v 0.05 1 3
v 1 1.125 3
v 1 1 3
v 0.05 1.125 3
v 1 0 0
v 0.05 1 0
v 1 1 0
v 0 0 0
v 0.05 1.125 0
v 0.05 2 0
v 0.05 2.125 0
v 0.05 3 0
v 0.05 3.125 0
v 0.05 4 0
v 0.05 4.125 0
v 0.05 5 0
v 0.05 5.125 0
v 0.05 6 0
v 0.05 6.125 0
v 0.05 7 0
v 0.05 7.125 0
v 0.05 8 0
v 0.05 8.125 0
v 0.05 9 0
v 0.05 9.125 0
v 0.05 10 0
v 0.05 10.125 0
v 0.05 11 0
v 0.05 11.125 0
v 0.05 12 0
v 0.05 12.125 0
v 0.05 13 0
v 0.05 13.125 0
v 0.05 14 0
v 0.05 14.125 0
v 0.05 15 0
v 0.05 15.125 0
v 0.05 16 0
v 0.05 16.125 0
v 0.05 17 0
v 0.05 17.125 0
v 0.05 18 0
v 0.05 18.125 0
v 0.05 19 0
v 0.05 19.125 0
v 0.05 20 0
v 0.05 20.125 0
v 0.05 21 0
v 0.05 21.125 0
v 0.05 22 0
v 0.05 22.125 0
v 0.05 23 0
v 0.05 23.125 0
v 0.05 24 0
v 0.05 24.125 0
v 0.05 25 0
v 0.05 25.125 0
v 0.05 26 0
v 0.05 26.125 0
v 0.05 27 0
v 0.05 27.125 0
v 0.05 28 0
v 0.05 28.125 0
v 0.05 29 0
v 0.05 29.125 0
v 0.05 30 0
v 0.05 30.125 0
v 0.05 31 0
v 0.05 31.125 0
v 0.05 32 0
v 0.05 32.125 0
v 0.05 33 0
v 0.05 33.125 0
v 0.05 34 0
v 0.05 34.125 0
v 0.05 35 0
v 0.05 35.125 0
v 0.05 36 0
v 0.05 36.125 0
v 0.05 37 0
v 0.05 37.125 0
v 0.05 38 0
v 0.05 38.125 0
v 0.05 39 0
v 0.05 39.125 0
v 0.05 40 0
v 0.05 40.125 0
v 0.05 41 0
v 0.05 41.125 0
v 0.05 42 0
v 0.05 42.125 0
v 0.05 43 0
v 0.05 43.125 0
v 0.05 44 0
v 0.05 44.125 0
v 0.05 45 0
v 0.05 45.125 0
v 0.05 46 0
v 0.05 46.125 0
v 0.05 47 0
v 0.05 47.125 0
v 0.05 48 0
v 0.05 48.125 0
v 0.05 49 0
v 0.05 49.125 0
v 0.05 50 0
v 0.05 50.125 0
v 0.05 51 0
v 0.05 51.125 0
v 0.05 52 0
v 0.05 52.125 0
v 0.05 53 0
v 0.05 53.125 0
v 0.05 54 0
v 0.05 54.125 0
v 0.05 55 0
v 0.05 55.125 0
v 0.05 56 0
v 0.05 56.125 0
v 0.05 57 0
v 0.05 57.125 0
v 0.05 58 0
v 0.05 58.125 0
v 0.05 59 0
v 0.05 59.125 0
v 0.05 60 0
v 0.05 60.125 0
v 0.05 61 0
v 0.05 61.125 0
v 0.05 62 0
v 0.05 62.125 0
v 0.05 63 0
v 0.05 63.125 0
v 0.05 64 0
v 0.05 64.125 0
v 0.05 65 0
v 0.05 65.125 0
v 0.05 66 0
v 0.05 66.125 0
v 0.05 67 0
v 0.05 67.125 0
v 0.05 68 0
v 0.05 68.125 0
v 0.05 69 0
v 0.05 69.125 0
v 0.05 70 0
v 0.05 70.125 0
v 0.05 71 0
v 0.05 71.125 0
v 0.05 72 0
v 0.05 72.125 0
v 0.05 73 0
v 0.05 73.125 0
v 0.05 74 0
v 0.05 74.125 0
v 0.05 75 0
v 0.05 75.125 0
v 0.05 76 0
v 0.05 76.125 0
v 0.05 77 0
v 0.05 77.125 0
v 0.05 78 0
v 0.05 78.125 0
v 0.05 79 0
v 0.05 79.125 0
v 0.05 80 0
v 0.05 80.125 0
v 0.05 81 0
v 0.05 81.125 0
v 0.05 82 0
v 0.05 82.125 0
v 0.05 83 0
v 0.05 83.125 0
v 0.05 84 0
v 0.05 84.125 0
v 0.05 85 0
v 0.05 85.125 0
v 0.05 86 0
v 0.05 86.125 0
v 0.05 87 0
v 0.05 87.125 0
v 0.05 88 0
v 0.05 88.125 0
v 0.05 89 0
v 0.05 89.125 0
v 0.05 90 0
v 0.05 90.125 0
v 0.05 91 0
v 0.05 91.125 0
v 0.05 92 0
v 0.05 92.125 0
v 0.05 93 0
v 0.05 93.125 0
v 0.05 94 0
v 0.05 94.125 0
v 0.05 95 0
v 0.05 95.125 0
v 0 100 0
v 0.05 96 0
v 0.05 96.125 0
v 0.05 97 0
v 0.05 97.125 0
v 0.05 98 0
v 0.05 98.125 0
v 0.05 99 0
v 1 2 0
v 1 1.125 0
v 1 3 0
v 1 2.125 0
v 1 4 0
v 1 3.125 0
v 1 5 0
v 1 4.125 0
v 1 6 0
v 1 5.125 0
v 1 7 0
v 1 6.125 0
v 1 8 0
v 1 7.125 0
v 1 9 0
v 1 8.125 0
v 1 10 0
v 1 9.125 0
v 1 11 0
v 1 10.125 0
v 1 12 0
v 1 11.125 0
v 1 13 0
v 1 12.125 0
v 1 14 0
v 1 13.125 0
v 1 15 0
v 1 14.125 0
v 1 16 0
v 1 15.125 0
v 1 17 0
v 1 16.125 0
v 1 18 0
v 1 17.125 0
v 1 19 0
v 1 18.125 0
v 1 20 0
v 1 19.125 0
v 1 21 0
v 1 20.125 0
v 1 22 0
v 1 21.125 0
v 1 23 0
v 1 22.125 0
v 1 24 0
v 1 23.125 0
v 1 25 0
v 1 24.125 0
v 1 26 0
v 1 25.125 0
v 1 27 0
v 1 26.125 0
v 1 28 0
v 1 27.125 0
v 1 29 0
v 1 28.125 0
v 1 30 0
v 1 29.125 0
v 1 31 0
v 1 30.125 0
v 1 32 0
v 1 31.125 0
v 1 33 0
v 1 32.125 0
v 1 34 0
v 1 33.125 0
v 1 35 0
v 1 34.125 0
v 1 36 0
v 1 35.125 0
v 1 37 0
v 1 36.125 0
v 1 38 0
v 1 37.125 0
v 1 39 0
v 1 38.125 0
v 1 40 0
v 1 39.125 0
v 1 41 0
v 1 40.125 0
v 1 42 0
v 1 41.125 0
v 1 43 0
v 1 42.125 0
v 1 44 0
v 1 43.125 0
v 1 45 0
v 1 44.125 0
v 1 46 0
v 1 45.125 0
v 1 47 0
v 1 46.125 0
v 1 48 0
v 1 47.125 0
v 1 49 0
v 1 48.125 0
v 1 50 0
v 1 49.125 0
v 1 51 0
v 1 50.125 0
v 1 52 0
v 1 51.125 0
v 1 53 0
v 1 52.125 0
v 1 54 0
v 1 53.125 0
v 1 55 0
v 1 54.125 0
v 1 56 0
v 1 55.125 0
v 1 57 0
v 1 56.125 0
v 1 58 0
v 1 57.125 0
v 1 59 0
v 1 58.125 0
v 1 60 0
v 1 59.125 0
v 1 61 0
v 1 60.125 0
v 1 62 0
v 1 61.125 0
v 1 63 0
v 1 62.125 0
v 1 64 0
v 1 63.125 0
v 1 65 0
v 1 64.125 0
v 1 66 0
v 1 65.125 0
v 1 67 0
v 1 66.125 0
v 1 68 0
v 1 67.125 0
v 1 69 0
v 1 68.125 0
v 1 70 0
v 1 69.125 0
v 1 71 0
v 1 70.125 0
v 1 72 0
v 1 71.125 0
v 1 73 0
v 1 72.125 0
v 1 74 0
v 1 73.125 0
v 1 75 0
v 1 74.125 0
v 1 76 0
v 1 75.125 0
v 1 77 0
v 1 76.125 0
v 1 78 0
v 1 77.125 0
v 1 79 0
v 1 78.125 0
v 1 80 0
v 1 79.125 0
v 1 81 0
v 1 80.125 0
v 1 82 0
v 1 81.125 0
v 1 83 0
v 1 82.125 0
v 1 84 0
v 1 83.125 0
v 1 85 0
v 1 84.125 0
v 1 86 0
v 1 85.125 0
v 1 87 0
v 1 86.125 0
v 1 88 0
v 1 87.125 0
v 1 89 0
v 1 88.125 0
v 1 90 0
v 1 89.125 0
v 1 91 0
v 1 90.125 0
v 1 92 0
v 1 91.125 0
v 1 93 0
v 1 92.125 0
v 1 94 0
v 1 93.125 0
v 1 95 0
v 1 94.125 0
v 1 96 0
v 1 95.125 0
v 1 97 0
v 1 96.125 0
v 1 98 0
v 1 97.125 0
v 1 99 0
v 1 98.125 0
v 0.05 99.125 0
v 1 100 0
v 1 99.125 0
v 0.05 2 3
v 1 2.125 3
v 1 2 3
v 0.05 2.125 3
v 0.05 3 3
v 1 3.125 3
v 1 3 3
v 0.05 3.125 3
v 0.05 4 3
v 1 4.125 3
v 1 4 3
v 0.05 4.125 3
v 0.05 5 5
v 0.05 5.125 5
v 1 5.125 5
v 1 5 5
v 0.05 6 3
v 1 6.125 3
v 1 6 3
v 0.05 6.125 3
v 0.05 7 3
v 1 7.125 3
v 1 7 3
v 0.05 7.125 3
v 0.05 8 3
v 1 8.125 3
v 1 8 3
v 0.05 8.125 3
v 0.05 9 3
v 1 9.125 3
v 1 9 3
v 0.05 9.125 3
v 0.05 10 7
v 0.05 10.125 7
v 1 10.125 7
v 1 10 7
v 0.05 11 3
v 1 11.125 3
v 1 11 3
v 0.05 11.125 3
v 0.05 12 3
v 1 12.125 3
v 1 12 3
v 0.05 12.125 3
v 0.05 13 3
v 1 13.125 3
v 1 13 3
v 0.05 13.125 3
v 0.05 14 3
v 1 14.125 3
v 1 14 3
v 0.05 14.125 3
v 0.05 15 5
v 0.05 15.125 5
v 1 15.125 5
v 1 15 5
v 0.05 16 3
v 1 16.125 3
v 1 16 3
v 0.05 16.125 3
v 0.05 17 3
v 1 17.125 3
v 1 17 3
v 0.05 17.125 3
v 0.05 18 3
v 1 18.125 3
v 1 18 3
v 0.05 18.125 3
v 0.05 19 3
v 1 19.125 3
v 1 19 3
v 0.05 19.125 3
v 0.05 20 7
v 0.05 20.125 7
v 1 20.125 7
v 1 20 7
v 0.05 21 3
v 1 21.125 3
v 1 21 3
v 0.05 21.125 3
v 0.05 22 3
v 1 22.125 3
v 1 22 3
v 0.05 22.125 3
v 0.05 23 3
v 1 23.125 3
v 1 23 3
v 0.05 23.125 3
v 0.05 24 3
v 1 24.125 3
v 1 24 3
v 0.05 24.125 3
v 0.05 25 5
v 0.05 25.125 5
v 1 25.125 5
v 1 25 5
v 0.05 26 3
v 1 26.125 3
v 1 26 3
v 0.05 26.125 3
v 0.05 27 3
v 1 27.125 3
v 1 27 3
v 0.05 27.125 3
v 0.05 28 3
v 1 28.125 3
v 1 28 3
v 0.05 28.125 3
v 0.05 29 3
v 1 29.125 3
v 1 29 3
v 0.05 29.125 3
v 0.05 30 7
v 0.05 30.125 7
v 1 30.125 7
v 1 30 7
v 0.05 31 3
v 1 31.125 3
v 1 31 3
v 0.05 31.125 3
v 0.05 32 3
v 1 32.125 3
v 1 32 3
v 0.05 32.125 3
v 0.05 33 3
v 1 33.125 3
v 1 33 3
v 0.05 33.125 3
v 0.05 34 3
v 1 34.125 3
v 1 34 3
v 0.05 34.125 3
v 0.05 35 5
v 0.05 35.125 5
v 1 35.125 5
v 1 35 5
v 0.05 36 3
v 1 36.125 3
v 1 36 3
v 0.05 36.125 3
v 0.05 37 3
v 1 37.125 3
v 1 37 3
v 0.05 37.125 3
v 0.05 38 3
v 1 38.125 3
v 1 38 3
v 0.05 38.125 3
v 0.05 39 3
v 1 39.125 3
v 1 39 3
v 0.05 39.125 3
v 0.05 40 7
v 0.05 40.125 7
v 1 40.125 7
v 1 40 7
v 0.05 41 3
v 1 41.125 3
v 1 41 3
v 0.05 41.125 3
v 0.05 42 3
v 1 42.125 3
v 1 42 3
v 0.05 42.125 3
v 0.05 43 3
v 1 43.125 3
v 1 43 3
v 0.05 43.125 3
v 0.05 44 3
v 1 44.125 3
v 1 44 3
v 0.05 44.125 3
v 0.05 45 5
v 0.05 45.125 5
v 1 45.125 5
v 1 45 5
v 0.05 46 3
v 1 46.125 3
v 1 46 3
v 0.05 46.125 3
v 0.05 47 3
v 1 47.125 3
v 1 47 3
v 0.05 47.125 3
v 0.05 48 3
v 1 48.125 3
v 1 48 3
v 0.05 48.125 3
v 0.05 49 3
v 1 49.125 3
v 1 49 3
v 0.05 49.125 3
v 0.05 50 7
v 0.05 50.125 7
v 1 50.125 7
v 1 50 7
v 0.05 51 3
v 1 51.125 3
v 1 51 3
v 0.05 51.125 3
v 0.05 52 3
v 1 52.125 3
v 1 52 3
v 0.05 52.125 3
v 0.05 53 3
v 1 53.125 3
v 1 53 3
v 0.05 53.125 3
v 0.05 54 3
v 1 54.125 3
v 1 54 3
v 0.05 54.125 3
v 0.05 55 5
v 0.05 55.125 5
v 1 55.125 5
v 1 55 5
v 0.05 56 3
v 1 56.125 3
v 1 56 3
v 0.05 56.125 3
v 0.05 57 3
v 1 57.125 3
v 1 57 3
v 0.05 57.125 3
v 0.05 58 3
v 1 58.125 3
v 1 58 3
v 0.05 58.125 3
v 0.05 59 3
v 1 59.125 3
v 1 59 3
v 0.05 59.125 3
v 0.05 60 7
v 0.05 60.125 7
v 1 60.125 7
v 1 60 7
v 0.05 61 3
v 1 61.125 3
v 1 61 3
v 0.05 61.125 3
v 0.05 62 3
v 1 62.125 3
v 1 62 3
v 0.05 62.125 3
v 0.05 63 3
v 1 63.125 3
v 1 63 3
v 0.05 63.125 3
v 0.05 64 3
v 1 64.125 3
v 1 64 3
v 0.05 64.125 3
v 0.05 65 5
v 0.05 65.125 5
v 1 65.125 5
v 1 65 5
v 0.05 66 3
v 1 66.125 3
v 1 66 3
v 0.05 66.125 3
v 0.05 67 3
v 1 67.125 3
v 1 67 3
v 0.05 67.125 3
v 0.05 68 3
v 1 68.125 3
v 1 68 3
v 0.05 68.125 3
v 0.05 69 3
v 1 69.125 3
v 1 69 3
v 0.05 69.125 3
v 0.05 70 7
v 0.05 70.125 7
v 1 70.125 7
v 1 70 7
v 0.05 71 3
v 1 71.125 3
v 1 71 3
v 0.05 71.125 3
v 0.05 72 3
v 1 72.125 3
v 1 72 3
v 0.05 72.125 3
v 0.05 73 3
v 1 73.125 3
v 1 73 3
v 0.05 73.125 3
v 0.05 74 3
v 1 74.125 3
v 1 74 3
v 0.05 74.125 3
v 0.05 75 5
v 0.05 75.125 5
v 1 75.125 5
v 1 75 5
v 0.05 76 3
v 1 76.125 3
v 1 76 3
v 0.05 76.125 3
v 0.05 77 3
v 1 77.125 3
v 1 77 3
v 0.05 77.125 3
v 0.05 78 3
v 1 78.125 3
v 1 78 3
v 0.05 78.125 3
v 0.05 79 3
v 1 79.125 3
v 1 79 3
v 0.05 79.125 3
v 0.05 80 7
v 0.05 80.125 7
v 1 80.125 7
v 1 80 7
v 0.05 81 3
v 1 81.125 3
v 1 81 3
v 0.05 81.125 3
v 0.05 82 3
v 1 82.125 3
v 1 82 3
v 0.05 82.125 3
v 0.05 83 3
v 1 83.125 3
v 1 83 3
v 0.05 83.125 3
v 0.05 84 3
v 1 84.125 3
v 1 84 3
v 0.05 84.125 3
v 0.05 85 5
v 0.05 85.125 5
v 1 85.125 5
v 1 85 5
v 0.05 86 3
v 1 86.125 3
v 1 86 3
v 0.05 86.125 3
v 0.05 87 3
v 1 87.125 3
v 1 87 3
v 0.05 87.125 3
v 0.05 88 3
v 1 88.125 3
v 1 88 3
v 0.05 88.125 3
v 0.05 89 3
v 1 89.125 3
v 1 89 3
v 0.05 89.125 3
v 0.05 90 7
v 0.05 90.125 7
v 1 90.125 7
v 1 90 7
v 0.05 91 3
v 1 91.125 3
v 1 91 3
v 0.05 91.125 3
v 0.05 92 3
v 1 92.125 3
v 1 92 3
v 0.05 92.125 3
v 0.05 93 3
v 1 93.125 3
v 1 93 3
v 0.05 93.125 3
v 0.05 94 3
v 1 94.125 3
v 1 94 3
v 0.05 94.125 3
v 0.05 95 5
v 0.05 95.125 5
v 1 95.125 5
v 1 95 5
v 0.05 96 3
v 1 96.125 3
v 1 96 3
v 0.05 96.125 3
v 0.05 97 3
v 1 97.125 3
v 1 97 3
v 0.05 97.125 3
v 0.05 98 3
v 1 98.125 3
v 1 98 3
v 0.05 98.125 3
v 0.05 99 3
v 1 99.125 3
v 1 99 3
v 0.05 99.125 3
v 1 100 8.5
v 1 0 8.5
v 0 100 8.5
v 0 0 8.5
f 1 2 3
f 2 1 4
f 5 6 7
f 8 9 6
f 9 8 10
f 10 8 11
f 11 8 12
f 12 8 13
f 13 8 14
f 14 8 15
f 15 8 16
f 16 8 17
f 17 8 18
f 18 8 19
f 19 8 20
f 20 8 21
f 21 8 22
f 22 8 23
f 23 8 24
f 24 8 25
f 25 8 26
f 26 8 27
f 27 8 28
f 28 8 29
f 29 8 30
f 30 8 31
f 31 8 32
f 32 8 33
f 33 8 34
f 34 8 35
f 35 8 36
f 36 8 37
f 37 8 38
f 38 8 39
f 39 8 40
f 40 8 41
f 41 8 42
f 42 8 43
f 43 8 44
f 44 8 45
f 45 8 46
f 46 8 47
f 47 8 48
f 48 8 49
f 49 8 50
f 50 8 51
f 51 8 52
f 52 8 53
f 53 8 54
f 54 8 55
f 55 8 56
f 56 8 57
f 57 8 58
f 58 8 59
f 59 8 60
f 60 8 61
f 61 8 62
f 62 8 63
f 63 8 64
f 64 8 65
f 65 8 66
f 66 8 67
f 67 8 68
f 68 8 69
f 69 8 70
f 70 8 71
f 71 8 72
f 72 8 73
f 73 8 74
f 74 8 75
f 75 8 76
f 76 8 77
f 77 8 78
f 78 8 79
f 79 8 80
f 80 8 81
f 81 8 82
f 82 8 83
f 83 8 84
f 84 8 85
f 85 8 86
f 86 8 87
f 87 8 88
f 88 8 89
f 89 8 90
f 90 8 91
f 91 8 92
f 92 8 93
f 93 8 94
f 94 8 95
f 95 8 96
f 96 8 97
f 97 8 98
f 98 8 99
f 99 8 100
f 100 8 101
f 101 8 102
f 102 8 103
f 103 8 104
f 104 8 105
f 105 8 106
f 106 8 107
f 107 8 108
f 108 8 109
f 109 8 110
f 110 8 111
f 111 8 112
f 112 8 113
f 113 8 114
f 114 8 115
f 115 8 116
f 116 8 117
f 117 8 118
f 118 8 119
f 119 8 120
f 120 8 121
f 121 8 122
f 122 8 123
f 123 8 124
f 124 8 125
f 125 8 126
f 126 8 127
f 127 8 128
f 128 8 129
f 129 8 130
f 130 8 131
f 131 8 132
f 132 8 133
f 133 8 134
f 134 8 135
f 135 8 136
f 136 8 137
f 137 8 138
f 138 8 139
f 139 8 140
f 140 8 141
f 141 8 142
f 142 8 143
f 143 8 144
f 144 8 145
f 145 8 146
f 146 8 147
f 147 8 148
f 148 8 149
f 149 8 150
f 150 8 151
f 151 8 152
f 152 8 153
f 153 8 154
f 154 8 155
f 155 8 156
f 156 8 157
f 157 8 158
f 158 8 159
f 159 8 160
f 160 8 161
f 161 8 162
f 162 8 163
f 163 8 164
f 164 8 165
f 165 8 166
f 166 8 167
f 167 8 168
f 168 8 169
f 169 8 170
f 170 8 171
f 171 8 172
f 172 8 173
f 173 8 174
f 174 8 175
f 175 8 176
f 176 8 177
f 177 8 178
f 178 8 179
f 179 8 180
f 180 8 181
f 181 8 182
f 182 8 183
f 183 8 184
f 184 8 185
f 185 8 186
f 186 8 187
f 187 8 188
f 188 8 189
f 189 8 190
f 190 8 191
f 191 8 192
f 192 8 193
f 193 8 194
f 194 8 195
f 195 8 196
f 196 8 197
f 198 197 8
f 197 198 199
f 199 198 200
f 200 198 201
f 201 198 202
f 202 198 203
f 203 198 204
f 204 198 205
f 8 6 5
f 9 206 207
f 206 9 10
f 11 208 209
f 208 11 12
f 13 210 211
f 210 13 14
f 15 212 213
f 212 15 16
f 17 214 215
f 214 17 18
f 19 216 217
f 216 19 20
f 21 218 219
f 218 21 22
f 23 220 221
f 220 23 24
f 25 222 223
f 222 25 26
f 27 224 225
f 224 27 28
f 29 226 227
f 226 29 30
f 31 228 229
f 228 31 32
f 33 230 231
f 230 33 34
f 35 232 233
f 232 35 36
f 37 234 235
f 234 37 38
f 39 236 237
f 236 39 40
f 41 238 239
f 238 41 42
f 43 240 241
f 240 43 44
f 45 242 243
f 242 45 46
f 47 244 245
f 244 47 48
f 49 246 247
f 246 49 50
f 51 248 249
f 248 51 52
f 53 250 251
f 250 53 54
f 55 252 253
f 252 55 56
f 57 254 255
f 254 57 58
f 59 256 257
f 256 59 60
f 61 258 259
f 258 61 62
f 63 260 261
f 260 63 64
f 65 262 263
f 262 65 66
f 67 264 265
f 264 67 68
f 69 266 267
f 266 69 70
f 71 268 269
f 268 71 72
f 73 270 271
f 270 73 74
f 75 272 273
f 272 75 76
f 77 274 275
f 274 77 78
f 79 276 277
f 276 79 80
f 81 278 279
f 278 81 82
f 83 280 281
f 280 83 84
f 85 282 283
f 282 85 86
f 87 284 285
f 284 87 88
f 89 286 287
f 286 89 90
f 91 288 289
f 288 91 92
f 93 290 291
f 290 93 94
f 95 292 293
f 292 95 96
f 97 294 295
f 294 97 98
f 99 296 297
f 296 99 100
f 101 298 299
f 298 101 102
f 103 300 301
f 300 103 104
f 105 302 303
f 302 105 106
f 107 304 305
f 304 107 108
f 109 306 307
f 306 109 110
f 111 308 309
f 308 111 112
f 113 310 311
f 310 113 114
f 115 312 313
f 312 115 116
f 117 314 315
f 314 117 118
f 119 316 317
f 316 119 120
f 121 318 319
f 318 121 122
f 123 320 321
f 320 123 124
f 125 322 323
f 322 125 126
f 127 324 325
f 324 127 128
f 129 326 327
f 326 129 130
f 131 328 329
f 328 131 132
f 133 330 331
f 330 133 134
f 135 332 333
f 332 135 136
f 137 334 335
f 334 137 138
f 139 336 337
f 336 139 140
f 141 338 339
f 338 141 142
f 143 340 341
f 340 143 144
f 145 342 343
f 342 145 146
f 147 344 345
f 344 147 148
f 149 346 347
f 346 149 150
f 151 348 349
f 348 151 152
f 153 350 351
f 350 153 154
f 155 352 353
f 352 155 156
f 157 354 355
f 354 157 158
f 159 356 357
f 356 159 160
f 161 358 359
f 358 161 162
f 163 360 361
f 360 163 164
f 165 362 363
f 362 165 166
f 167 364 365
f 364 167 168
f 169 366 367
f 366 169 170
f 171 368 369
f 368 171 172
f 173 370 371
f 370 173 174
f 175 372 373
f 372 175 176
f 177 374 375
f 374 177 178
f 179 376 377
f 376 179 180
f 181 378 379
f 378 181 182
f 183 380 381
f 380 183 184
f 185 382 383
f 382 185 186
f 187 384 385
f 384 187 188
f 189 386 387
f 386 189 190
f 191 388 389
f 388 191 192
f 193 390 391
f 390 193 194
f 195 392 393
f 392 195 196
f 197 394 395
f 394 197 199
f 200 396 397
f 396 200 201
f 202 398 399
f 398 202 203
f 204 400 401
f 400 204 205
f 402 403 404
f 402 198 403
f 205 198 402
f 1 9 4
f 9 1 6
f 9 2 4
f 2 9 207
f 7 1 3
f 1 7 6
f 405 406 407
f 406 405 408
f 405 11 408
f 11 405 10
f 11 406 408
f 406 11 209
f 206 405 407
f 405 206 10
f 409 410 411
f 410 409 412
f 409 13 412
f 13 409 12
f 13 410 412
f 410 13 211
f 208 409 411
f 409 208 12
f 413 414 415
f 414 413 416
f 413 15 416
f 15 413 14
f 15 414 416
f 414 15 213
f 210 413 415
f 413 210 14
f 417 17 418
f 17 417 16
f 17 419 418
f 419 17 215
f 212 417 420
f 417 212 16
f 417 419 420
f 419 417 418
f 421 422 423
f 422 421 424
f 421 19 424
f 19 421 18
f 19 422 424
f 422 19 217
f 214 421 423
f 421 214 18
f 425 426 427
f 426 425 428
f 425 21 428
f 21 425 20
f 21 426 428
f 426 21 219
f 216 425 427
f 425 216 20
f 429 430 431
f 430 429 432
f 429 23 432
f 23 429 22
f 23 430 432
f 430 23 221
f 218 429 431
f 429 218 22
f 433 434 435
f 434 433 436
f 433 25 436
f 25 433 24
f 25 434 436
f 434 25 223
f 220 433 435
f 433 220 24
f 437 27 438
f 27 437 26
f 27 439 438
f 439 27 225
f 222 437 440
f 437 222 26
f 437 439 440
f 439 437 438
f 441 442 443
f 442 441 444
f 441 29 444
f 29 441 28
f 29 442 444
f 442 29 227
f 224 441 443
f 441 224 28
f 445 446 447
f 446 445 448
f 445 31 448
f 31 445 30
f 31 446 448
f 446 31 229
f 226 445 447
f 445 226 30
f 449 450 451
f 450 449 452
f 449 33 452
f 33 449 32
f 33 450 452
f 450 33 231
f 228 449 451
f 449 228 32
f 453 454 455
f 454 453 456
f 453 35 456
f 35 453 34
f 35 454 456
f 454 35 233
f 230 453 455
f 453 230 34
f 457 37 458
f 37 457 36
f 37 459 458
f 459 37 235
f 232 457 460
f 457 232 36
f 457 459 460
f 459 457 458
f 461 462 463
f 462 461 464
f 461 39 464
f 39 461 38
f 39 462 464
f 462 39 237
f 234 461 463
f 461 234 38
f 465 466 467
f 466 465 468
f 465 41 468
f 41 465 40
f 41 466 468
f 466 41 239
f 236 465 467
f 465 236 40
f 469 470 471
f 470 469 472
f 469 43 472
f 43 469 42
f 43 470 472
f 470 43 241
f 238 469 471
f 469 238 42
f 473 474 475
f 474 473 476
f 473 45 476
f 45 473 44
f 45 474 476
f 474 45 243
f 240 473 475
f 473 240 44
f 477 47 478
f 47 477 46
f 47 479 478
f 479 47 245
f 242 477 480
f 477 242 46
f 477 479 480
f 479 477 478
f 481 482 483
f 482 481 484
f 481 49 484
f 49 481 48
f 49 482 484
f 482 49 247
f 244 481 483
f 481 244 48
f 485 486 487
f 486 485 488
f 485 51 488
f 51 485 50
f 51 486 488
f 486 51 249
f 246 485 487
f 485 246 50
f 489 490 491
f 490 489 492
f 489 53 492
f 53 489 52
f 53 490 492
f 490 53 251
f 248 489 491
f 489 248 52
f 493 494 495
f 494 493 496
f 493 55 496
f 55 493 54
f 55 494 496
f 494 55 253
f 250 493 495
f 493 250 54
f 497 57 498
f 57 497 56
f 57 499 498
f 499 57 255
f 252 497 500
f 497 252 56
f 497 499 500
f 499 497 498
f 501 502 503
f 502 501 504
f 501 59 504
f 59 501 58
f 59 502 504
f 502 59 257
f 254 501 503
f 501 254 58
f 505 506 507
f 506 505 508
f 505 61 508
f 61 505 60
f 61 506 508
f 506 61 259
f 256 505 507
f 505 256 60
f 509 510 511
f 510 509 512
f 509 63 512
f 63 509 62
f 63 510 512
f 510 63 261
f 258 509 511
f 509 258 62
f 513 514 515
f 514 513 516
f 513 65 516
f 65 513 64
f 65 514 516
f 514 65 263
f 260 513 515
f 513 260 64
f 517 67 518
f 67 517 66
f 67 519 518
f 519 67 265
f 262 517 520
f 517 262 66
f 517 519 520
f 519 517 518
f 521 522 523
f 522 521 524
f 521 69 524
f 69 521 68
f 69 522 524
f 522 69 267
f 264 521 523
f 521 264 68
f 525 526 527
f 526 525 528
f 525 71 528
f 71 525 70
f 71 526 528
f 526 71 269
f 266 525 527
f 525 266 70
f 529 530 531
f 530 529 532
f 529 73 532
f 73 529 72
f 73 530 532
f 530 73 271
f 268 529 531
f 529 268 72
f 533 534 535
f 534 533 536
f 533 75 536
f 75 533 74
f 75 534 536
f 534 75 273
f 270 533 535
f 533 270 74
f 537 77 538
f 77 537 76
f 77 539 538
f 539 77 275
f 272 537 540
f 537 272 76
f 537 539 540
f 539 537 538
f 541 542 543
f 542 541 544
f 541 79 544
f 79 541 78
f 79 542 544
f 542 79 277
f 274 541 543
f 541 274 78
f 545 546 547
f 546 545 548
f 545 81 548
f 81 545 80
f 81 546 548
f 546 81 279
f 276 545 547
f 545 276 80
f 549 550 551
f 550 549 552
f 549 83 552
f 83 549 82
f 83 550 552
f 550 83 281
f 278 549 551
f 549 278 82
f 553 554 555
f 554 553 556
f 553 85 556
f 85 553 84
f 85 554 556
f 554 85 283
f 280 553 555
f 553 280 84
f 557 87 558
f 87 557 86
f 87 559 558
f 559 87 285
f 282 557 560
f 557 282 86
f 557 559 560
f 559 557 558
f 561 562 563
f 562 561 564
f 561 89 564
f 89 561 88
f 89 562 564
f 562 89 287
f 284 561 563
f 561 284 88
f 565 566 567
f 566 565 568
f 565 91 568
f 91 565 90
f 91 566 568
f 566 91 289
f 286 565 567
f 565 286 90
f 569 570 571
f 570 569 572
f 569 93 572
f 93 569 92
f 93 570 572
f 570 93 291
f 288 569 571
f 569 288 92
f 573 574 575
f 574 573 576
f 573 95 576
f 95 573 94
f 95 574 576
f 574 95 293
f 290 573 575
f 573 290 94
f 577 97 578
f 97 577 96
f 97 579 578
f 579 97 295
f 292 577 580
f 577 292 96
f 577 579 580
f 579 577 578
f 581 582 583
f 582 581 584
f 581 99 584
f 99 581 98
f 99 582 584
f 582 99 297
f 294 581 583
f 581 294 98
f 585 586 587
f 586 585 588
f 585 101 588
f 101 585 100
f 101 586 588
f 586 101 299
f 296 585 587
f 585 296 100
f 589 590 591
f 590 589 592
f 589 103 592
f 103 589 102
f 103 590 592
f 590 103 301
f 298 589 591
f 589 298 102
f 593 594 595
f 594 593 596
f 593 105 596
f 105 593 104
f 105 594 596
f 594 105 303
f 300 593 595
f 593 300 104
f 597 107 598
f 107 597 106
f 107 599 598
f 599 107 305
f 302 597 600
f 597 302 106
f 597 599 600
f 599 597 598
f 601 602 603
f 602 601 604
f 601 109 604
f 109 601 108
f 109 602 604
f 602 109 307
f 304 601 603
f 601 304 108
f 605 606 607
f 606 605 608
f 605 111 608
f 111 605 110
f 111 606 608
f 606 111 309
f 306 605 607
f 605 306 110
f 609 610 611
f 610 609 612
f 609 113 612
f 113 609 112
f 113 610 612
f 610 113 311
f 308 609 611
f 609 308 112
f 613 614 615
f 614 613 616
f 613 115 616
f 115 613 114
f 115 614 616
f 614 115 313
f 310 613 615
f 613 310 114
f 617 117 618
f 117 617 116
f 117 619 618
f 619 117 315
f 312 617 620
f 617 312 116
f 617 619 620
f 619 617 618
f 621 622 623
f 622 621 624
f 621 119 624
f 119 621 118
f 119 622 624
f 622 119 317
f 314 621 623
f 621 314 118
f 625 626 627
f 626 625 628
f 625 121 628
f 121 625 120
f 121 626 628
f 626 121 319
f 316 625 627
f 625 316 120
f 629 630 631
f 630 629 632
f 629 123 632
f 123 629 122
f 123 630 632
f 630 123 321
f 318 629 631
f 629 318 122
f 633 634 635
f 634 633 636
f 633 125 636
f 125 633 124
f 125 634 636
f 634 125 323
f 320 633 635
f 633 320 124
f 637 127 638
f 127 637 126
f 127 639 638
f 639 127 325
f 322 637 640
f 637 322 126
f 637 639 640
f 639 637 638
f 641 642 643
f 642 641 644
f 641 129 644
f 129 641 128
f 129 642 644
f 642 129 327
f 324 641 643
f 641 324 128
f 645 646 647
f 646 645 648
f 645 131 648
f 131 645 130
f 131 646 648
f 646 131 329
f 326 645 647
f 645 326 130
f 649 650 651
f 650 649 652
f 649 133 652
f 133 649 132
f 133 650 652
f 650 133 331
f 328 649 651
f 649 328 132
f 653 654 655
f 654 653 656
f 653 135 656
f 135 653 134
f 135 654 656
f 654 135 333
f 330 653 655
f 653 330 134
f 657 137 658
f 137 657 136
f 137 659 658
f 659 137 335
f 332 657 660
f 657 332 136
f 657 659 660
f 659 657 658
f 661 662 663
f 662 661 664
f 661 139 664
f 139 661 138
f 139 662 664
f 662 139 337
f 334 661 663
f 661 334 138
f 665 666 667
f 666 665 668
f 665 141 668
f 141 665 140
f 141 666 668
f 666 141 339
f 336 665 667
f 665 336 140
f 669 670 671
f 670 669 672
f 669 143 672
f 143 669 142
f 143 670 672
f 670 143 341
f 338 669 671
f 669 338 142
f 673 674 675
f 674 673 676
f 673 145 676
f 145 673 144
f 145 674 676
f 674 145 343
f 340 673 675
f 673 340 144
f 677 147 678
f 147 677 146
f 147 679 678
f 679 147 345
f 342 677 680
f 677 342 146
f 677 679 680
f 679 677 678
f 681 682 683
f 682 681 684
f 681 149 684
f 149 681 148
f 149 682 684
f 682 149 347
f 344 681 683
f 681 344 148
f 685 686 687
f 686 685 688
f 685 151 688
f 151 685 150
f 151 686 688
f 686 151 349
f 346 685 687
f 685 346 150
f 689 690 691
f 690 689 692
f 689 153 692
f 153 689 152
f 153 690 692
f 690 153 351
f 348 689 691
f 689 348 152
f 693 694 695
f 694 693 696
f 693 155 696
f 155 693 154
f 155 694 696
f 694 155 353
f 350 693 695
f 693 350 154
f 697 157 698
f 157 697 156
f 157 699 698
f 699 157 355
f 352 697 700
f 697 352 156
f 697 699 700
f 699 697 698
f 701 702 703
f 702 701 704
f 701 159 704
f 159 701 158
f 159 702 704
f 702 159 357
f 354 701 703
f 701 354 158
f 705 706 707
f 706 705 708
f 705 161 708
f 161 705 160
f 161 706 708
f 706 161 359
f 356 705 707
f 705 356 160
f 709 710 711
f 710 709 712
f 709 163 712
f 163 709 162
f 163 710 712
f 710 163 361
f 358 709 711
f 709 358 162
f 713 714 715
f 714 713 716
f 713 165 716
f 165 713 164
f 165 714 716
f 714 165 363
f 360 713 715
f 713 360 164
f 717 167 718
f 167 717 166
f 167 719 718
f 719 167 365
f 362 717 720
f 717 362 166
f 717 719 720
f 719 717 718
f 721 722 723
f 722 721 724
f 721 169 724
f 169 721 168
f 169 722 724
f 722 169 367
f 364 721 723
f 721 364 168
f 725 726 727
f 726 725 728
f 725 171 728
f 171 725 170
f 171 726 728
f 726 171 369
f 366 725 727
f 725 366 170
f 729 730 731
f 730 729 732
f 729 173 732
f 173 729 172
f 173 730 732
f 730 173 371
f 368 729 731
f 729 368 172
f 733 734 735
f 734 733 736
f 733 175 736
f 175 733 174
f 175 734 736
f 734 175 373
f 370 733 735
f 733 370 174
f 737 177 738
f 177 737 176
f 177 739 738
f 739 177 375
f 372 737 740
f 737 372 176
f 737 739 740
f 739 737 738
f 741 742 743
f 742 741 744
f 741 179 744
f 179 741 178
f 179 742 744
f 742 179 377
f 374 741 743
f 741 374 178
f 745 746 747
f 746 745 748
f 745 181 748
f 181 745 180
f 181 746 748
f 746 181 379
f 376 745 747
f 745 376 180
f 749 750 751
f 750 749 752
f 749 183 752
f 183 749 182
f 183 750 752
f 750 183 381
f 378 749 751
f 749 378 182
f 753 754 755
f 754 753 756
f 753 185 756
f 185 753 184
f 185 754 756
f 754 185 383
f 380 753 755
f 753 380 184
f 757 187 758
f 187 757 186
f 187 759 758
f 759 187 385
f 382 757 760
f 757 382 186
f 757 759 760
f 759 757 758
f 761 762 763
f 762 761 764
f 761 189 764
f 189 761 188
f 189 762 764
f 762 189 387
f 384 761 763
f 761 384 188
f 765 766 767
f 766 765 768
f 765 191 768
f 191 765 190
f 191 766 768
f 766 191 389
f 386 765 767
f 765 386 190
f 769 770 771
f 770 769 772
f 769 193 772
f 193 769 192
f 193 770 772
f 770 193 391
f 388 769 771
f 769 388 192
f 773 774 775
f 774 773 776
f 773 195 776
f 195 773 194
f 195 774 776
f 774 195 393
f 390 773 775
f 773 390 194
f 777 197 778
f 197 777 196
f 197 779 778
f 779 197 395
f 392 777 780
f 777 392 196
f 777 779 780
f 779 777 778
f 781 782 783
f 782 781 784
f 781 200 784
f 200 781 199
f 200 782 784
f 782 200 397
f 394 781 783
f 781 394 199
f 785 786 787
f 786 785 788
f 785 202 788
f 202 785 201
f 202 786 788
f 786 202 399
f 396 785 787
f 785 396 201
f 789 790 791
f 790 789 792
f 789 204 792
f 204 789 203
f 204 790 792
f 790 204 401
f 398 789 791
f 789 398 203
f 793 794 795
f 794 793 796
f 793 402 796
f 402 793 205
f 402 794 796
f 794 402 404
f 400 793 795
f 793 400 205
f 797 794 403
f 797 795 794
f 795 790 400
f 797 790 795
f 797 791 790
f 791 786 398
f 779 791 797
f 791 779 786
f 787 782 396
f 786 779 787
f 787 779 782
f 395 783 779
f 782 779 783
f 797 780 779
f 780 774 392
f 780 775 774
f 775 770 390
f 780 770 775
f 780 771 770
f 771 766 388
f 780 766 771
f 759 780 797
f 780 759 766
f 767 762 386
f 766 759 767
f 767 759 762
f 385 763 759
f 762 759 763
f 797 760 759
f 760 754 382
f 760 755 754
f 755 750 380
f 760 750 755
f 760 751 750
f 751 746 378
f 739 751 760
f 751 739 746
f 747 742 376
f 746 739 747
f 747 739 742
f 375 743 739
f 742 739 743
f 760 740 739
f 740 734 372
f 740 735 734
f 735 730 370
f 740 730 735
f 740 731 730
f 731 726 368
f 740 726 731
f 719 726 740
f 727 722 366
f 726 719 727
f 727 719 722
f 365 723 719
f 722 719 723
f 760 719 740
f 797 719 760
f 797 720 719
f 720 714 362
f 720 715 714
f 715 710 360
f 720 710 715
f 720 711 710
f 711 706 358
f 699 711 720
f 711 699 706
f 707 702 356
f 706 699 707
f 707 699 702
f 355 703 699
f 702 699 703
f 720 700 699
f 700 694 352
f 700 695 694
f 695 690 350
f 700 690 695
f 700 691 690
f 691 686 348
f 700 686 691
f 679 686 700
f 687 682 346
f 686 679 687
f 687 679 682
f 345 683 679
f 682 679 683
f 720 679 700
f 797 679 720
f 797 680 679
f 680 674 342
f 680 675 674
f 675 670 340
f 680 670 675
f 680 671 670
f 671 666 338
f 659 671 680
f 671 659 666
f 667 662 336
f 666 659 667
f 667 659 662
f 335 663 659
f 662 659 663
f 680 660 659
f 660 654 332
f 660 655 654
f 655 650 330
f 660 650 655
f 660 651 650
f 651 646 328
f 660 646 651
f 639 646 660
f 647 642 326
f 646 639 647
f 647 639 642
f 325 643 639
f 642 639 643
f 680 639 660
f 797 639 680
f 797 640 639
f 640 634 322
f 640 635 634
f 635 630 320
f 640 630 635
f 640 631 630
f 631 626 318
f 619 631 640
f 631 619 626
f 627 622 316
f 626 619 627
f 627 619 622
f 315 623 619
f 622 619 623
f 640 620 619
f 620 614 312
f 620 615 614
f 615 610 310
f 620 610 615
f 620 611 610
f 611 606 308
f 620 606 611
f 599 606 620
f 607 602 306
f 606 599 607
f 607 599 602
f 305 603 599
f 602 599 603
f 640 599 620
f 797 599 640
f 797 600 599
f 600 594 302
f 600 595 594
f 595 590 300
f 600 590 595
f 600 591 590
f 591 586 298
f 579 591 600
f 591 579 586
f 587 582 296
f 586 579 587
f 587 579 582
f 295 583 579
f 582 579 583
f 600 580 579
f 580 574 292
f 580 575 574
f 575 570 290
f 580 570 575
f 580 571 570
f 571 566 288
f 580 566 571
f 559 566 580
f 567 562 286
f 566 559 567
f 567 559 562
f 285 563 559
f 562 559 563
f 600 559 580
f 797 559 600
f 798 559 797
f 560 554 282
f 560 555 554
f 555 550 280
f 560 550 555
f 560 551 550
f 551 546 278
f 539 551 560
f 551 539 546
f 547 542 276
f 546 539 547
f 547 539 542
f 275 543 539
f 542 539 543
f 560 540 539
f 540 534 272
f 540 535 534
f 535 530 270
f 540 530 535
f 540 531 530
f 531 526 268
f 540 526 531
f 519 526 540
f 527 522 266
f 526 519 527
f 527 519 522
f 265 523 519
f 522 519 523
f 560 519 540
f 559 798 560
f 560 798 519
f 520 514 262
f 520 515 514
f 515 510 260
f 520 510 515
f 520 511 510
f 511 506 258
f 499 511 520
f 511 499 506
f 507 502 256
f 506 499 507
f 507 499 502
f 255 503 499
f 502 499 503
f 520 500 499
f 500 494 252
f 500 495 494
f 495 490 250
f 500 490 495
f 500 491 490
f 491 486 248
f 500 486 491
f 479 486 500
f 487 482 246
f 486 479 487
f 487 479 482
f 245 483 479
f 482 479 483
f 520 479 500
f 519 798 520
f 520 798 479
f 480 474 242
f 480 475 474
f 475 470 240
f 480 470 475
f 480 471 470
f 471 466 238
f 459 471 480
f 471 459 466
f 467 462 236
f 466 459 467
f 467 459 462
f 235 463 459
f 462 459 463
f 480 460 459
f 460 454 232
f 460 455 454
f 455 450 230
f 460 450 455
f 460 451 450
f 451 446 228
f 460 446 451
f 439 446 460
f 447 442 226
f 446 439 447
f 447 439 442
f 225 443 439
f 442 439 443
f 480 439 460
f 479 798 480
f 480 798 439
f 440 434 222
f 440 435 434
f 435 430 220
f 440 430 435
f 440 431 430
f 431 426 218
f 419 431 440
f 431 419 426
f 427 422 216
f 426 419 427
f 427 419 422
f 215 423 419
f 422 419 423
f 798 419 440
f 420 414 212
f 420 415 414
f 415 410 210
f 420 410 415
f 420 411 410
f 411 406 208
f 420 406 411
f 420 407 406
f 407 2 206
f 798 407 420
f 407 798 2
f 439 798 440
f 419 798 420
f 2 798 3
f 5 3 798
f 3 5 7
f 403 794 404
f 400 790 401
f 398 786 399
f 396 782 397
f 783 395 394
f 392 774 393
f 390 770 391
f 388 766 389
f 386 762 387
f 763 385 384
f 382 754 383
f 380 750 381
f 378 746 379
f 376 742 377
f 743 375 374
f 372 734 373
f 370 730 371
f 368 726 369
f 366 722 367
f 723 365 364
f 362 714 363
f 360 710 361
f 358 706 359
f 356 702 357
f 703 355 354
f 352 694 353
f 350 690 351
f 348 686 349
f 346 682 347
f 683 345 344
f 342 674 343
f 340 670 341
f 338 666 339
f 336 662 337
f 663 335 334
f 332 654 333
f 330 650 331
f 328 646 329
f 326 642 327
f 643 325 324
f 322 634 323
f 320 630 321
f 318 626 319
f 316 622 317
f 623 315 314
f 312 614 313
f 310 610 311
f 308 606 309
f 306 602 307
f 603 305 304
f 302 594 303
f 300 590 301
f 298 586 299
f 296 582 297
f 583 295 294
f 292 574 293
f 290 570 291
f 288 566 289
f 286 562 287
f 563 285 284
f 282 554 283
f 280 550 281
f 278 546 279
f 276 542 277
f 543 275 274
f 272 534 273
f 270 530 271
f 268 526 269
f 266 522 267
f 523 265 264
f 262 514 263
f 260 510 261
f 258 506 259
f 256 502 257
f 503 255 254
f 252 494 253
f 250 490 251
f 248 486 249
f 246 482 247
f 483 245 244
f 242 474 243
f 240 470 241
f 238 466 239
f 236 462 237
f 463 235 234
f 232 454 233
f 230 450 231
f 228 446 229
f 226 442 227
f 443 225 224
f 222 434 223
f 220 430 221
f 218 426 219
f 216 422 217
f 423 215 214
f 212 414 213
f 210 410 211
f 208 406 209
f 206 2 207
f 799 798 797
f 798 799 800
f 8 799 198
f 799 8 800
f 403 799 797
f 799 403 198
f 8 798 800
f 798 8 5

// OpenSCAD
/*Righello della lunghezza desiderata con sensibilità di 1mm*/
l=100; //lunghezza in mm
difference()
{
    cube([1, l, 8.5 ]);
    for (i = [1:l-1])
    {
        translate([0.05, i, 0]) cube([1, 0.125, 3 ]);
        if (i % 5 == 0)
        {
            translate([0.05, i, 0]) cube([5, 0.125, 5 ]);
        }
        if (i % 10 == 0)
        {
            translate([0.05, i, 0]) cube([10, 0.125, 7 ]);
        }
    }
}
